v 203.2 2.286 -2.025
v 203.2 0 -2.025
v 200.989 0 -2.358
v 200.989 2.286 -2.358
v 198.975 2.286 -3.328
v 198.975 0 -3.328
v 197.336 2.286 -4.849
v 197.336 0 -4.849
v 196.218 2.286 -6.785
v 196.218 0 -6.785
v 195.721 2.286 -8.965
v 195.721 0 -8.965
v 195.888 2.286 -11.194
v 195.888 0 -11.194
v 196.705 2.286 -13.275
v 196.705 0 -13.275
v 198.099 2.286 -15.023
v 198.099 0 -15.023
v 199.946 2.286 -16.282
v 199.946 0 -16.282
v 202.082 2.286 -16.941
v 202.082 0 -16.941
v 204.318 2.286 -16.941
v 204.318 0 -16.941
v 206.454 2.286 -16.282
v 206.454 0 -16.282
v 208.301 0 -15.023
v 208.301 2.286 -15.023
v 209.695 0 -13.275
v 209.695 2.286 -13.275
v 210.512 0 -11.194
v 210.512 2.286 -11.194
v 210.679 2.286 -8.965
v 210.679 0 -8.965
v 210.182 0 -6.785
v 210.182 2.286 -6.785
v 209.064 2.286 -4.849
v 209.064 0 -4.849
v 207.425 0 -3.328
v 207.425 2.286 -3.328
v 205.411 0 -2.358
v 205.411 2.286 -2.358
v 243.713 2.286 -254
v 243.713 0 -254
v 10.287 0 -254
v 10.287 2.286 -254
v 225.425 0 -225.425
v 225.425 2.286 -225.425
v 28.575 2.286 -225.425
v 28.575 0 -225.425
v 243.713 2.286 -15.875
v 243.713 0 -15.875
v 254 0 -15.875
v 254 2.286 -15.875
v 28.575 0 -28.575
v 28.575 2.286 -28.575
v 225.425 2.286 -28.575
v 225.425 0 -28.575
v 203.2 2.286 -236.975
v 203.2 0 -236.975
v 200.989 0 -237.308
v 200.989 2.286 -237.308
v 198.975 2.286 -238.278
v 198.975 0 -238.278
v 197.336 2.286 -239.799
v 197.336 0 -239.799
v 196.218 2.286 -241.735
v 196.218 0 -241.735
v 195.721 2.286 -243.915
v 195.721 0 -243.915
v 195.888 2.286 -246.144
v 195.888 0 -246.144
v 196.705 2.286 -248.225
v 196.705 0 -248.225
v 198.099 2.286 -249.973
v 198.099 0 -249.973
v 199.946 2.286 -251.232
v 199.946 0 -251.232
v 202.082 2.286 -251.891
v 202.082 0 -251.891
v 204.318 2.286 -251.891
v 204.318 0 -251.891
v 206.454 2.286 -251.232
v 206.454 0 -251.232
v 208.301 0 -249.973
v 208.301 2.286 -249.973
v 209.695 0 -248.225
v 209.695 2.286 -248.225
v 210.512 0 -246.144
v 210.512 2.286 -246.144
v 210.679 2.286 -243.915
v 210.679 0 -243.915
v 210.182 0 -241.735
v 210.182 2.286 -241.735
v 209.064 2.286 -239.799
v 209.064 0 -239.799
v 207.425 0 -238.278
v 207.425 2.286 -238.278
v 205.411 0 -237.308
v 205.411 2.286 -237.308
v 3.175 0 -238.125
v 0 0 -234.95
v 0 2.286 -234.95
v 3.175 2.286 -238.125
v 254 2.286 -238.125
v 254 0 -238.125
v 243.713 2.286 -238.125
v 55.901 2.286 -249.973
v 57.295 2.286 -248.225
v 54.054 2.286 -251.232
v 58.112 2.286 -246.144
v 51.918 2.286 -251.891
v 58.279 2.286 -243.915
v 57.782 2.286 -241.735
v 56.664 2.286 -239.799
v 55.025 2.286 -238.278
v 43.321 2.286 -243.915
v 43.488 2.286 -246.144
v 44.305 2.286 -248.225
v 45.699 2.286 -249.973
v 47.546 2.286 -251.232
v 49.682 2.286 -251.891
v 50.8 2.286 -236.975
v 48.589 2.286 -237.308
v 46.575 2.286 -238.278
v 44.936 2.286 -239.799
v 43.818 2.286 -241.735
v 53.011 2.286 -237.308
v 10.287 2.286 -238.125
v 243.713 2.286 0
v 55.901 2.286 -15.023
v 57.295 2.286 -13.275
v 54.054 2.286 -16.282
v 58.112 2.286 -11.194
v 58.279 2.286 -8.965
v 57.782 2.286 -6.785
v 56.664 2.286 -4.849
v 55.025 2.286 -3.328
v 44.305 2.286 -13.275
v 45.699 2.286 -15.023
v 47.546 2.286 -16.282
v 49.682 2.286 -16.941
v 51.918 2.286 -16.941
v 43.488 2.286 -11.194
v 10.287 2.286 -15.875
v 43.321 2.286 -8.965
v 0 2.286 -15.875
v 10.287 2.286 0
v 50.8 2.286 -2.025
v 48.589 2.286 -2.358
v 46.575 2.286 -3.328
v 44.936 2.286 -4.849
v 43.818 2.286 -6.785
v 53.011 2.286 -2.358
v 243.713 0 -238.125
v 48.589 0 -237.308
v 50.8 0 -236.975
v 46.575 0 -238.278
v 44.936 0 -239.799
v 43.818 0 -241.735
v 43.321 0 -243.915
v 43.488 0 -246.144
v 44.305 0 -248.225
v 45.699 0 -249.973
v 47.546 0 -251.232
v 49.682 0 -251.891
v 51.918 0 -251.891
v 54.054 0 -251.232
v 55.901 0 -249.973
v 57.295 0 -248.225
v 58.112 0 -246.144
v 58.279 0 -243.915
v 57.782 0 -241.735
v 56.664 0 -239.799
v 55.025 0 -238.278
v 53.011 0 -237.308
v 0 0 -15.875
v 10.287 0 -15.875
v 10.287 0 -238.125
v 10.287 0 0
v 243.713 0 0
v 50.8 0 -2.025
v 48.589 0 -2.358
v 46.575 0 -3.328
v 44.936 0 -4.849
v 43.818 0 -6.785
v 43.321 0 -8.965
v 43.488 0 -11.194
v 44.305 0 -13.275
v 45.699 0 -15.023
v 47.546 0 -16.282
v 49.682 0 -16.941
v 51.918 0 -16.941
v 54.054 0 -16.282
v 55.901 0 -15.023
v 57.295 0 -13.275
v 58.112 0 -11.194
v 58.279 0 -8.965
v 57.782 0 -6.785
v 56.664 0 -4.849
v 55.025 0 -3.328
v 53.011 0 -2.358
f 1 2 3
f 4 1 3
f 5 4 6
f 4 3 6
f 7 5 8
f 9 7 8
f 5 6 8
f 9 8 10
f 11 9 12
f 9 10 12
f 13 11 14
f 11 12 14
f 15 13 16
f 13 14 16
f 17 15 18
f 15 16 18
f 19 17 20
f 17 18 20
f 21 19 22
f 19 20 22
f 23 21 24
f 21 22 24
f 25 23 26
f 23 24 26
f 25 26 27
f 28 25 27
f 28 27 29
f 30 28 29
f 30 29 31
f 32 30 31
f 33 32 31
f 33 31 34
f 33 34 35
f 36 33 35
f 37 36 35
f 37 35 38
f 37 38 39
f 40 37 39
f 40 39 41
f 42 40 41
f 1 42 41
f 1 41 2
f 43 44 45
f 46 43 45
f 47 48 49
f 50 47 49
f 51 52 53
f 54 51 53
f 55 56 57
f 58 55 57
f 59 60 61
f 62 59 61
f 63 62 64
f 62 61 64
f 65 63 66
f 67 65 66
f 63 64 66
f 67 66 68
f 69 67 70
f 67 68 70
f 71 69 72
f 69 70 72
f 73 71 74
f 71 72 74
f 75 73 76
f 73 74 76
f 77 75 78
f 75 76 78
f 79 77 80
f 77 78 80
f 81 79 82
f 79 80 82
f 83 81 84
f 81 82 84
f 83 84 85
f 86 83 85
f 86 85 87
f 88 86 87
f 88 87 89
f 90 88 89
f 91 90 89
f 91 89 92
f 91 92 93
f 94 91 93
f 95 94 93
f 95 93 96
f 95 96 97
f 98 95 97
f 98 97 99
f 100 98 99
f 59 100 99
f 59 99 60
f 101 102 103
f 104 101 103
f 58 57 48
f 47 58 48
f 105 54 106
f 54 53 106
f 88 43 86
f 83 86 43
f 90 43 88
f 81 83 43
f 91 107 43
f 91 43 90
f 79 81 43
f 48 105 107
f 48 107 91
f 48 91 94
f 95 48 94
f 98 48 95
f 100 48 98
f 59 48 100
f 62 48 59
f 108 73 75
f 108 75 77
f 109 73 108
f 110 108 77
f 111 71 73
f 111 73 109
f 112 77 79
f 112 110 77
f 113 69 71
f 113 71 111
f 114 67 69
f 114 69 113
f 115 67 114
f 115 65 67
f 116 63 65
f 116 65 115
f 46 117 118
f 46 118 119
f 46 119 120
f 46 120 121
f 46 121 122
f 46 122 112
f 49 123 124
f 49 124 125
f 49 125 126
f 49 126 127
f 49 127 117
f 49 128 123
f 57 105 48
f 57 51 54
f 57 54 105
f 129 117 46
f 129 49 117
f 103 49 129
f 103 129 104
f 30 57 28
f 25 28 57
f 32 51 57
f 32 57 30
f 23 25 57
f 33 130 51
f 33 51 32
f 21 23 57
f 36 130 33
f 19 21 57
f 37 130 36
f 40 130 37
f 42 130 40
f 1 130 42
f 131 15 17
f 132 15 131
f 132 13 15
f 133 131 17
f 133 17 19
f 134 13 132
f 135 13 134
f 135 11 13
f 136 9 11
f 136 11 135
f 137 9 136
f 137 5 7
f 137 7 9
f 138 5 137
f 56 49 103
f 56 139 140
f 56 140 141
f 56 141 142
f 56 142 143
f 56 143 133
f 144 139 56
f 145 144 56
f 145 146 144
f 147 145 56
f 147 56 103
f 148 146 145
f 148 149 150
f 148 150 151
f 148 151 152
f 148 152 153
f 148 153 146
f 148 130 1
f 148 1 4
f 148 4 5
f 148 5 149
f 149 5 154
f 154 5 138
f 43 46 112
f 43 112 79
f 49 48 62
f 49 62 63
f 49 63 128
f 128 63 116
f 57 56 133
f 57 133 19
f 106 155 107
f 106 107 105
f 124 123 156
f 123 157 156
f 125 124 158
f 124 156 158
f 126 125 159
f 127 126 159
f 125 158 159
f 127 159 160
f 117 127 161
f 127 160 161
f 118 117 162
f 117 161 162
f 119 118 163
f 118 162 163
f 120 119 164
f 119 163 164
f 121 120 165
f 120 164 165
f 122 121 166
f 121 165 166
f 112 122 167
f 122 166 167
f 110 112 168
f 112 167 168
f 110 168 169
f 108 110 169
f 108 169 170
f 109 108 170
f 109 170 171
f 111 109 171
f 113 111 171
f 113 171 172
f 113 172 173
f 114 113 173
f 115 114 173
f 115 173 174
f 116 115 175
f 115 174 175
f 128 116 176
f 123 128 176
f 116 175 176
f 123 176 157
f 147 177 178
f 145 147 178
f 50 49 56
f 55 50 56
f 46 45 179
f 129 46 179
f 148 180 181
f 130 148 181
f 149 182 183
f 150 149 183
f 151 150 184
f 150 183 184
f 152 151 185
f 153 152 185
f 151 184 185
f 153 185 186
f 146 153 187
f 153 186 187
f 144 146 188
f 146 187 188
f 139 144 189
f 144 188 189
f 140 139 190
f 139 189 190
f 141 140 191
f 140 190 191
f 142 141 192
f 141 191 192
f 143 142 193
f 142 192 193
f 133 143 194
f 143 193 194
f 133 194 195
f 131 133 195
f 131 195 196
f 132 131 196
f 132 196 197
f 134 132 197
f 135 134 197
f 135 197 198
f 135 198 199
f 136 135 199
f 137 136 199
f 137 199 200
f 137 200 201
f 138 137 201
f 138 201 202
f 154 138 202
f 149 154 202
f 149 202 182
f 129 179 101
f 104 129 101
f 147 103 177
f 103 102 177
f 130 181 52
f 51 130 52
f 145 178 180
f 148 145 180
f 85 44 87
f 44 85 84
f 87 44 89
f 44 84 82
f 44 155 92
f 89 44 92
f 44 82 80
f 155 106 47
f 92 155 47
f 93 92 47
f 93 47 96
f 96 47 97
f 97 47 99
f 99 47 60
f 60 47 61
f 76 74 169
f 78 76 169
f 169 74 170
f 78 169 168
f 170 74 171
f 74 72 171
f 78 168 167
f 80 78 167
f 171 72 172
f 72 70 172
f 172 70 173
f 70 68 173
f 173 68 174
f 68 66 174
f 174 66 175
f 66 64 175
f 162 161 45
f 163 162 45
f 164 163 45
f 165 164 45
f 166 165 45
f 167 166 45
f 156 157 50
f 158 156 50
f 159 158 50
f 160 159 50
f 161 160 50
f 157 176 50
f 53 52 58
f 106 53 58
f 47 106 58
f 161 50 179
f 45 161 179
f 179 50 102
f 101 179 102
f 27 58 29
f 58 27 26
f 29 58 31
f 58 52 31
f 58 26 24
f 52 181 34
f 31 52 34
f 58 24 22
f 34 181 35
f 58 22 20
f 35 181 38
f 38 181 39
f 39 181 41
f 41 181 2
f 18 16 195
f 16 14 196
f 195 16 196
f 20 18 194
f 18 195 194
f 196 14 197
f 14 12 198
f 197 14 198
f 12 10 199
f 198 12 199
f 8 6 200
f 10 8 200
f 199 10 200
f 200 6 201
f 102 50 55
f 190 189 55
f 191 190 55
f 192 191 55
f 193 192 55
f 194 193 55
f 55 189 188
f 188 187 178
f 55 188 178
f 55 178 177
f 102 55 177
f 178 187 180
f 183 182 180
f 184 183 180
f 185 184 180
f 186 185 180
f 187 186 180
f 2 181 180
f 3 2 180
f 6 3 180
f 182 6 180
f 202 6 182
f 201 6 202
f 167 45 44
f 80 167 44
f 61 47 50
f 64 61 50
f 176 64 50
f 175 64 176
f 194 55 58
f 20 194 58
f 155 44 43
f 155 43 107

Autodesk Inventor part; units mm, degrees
ref_plane "YZ Plane" through (0, 0, 0) normal (1, 0, 0) x (0, 1, 0)
ref_plane "XZ Plane" through (0, 0, 0) normal (0, 1, 0) x (-1, 0, 0)
ref_plane "XY Plane" through (0, 0, 0) normal (0, 0, 1) x (1, 0, 0)
sketch "Sketch1" plane through (0, 0, 0) normal (0, 1, 0) x (-1, 0, 0)
  line L0 (0, 0) -> (-254, 0)
  line L1 (-254, 0) -> (-254, -254)
  line L2 (-254, -254) -> (0, -254)
  line L3 (0, -254) -> (0, 0)
  line L4 (0, -15.875) -> (-10.287, -15.875)
  line L5 (-10.287, -15.875) -> (-10.287, 0)
  line L6 (-243.713, 0) -> (-243.713, -15.875)
  line L7 (-243.713, -15.875) -> (-254, -15.875)
  line L8 (-243.713, -254) -> (-243.713, -238.125)
  line L9 (-243.713, -238.125) -> (-254, -238.125)
  line L10 (-10.287, -254) -> (-10.287, -238.125)
  line L11 (-10.287, -238.125) -> (0, -238.125)
  dimension "d0" = 254
  dimension "d1" = 254
  dimension "d14" = 10.287
  dimension "d15" = 10.287
  dimension "d16" = 15.875
  dimension "d17" = 15.875
extrude "Extrusion1" add sketch "Sketch1" along normal blind 2.286 contours L5 L4 L3 L11 L10 L2 L8 L9 L1 L7 L6 L0
sketch "Sketch2" plane through (0, 2.286, 0) normal (0, 1, 0) x (1, 0, 0)
  line L0 (28.575, 28.575) -> (225.425, 28.575)
  line L1 (225.425, 28.575) -> (225.425, 225.425)
  line L2 (225.425, 225.425) -> (28.575, 225.425)
  line L3 (28.575, 225.425) -> (28.575, 28.575)
  line L4 (0, 15.875) -> (10.287, 15.875) projected
  line L5 (10.287, 15.875) -> (10.287, 0) projected
  line L6 (10.287, 0) -> (243.713, 0) projected
  line L7 (243.713, 0) -> (243.713, 15.875) projected
  line L8 (243.713, 15.875) -> (254, 15.875) projected
  line L9 (254, 15.875) -> (254, 238.125) projected
  line L10 (254, 238.125) -> (243.713, 238.125) projected
  line L11 (243.713, 238.125) -> (243.713, 254) projected
  line L12 (243.713, 254) -> (10.287, 254) projected
  line L13 (10.287, 254) -> (10.287, 238.125) projected
  line L14 (10.287, 238.125) -> (0, 238.125) projected
  line L15 (0, 238.125) -> (0, 15.875) projected
  point P0 (0, 0)
  point P1 (127, 28.575)
  point P2 (127, 0)
  point P3 (28.575, 127)
  point P4 (0, 127)
  dimension "d9" = 196.85
  dimension "d10" = 196.85
extrude "Extrusion2" cut sketch "Sketch2" against normal through all contours L3 L2 L1 L0
sketch "Sketch3" plane through (0, 2.286, 0) normal (0, 1, 0) x (1, 0, 0)
  circle A0 centre (50.8, 9.525) radius 4 projected
  circle A1 centre (203.2, 9.525) radius 4 projected
  circle A2 centre (203.2, 244.475) radius 4.2037 projected
  circle A3 centre (50.8, 244.475) radius 4.2037 projected
  point P0 (0, 0)
hole "Hole1" at (50.8, 2.286, -9.525) at (50.8, 2.286, -244.475) at (203.2, 2.286, -244.475) at (203.2, 2.286, -9.525) direction (0, -1, 0) diameter 15 end through all
chamfer "Chamfer1" distance 3.175 angle 45 1 edges at (0, 1.143, -238.125)
equation "\"d15\" = d14"
equation "\"d17\" = d16"
equation "\"d9\" = d10"
properties part number "Carriage Sheet"
